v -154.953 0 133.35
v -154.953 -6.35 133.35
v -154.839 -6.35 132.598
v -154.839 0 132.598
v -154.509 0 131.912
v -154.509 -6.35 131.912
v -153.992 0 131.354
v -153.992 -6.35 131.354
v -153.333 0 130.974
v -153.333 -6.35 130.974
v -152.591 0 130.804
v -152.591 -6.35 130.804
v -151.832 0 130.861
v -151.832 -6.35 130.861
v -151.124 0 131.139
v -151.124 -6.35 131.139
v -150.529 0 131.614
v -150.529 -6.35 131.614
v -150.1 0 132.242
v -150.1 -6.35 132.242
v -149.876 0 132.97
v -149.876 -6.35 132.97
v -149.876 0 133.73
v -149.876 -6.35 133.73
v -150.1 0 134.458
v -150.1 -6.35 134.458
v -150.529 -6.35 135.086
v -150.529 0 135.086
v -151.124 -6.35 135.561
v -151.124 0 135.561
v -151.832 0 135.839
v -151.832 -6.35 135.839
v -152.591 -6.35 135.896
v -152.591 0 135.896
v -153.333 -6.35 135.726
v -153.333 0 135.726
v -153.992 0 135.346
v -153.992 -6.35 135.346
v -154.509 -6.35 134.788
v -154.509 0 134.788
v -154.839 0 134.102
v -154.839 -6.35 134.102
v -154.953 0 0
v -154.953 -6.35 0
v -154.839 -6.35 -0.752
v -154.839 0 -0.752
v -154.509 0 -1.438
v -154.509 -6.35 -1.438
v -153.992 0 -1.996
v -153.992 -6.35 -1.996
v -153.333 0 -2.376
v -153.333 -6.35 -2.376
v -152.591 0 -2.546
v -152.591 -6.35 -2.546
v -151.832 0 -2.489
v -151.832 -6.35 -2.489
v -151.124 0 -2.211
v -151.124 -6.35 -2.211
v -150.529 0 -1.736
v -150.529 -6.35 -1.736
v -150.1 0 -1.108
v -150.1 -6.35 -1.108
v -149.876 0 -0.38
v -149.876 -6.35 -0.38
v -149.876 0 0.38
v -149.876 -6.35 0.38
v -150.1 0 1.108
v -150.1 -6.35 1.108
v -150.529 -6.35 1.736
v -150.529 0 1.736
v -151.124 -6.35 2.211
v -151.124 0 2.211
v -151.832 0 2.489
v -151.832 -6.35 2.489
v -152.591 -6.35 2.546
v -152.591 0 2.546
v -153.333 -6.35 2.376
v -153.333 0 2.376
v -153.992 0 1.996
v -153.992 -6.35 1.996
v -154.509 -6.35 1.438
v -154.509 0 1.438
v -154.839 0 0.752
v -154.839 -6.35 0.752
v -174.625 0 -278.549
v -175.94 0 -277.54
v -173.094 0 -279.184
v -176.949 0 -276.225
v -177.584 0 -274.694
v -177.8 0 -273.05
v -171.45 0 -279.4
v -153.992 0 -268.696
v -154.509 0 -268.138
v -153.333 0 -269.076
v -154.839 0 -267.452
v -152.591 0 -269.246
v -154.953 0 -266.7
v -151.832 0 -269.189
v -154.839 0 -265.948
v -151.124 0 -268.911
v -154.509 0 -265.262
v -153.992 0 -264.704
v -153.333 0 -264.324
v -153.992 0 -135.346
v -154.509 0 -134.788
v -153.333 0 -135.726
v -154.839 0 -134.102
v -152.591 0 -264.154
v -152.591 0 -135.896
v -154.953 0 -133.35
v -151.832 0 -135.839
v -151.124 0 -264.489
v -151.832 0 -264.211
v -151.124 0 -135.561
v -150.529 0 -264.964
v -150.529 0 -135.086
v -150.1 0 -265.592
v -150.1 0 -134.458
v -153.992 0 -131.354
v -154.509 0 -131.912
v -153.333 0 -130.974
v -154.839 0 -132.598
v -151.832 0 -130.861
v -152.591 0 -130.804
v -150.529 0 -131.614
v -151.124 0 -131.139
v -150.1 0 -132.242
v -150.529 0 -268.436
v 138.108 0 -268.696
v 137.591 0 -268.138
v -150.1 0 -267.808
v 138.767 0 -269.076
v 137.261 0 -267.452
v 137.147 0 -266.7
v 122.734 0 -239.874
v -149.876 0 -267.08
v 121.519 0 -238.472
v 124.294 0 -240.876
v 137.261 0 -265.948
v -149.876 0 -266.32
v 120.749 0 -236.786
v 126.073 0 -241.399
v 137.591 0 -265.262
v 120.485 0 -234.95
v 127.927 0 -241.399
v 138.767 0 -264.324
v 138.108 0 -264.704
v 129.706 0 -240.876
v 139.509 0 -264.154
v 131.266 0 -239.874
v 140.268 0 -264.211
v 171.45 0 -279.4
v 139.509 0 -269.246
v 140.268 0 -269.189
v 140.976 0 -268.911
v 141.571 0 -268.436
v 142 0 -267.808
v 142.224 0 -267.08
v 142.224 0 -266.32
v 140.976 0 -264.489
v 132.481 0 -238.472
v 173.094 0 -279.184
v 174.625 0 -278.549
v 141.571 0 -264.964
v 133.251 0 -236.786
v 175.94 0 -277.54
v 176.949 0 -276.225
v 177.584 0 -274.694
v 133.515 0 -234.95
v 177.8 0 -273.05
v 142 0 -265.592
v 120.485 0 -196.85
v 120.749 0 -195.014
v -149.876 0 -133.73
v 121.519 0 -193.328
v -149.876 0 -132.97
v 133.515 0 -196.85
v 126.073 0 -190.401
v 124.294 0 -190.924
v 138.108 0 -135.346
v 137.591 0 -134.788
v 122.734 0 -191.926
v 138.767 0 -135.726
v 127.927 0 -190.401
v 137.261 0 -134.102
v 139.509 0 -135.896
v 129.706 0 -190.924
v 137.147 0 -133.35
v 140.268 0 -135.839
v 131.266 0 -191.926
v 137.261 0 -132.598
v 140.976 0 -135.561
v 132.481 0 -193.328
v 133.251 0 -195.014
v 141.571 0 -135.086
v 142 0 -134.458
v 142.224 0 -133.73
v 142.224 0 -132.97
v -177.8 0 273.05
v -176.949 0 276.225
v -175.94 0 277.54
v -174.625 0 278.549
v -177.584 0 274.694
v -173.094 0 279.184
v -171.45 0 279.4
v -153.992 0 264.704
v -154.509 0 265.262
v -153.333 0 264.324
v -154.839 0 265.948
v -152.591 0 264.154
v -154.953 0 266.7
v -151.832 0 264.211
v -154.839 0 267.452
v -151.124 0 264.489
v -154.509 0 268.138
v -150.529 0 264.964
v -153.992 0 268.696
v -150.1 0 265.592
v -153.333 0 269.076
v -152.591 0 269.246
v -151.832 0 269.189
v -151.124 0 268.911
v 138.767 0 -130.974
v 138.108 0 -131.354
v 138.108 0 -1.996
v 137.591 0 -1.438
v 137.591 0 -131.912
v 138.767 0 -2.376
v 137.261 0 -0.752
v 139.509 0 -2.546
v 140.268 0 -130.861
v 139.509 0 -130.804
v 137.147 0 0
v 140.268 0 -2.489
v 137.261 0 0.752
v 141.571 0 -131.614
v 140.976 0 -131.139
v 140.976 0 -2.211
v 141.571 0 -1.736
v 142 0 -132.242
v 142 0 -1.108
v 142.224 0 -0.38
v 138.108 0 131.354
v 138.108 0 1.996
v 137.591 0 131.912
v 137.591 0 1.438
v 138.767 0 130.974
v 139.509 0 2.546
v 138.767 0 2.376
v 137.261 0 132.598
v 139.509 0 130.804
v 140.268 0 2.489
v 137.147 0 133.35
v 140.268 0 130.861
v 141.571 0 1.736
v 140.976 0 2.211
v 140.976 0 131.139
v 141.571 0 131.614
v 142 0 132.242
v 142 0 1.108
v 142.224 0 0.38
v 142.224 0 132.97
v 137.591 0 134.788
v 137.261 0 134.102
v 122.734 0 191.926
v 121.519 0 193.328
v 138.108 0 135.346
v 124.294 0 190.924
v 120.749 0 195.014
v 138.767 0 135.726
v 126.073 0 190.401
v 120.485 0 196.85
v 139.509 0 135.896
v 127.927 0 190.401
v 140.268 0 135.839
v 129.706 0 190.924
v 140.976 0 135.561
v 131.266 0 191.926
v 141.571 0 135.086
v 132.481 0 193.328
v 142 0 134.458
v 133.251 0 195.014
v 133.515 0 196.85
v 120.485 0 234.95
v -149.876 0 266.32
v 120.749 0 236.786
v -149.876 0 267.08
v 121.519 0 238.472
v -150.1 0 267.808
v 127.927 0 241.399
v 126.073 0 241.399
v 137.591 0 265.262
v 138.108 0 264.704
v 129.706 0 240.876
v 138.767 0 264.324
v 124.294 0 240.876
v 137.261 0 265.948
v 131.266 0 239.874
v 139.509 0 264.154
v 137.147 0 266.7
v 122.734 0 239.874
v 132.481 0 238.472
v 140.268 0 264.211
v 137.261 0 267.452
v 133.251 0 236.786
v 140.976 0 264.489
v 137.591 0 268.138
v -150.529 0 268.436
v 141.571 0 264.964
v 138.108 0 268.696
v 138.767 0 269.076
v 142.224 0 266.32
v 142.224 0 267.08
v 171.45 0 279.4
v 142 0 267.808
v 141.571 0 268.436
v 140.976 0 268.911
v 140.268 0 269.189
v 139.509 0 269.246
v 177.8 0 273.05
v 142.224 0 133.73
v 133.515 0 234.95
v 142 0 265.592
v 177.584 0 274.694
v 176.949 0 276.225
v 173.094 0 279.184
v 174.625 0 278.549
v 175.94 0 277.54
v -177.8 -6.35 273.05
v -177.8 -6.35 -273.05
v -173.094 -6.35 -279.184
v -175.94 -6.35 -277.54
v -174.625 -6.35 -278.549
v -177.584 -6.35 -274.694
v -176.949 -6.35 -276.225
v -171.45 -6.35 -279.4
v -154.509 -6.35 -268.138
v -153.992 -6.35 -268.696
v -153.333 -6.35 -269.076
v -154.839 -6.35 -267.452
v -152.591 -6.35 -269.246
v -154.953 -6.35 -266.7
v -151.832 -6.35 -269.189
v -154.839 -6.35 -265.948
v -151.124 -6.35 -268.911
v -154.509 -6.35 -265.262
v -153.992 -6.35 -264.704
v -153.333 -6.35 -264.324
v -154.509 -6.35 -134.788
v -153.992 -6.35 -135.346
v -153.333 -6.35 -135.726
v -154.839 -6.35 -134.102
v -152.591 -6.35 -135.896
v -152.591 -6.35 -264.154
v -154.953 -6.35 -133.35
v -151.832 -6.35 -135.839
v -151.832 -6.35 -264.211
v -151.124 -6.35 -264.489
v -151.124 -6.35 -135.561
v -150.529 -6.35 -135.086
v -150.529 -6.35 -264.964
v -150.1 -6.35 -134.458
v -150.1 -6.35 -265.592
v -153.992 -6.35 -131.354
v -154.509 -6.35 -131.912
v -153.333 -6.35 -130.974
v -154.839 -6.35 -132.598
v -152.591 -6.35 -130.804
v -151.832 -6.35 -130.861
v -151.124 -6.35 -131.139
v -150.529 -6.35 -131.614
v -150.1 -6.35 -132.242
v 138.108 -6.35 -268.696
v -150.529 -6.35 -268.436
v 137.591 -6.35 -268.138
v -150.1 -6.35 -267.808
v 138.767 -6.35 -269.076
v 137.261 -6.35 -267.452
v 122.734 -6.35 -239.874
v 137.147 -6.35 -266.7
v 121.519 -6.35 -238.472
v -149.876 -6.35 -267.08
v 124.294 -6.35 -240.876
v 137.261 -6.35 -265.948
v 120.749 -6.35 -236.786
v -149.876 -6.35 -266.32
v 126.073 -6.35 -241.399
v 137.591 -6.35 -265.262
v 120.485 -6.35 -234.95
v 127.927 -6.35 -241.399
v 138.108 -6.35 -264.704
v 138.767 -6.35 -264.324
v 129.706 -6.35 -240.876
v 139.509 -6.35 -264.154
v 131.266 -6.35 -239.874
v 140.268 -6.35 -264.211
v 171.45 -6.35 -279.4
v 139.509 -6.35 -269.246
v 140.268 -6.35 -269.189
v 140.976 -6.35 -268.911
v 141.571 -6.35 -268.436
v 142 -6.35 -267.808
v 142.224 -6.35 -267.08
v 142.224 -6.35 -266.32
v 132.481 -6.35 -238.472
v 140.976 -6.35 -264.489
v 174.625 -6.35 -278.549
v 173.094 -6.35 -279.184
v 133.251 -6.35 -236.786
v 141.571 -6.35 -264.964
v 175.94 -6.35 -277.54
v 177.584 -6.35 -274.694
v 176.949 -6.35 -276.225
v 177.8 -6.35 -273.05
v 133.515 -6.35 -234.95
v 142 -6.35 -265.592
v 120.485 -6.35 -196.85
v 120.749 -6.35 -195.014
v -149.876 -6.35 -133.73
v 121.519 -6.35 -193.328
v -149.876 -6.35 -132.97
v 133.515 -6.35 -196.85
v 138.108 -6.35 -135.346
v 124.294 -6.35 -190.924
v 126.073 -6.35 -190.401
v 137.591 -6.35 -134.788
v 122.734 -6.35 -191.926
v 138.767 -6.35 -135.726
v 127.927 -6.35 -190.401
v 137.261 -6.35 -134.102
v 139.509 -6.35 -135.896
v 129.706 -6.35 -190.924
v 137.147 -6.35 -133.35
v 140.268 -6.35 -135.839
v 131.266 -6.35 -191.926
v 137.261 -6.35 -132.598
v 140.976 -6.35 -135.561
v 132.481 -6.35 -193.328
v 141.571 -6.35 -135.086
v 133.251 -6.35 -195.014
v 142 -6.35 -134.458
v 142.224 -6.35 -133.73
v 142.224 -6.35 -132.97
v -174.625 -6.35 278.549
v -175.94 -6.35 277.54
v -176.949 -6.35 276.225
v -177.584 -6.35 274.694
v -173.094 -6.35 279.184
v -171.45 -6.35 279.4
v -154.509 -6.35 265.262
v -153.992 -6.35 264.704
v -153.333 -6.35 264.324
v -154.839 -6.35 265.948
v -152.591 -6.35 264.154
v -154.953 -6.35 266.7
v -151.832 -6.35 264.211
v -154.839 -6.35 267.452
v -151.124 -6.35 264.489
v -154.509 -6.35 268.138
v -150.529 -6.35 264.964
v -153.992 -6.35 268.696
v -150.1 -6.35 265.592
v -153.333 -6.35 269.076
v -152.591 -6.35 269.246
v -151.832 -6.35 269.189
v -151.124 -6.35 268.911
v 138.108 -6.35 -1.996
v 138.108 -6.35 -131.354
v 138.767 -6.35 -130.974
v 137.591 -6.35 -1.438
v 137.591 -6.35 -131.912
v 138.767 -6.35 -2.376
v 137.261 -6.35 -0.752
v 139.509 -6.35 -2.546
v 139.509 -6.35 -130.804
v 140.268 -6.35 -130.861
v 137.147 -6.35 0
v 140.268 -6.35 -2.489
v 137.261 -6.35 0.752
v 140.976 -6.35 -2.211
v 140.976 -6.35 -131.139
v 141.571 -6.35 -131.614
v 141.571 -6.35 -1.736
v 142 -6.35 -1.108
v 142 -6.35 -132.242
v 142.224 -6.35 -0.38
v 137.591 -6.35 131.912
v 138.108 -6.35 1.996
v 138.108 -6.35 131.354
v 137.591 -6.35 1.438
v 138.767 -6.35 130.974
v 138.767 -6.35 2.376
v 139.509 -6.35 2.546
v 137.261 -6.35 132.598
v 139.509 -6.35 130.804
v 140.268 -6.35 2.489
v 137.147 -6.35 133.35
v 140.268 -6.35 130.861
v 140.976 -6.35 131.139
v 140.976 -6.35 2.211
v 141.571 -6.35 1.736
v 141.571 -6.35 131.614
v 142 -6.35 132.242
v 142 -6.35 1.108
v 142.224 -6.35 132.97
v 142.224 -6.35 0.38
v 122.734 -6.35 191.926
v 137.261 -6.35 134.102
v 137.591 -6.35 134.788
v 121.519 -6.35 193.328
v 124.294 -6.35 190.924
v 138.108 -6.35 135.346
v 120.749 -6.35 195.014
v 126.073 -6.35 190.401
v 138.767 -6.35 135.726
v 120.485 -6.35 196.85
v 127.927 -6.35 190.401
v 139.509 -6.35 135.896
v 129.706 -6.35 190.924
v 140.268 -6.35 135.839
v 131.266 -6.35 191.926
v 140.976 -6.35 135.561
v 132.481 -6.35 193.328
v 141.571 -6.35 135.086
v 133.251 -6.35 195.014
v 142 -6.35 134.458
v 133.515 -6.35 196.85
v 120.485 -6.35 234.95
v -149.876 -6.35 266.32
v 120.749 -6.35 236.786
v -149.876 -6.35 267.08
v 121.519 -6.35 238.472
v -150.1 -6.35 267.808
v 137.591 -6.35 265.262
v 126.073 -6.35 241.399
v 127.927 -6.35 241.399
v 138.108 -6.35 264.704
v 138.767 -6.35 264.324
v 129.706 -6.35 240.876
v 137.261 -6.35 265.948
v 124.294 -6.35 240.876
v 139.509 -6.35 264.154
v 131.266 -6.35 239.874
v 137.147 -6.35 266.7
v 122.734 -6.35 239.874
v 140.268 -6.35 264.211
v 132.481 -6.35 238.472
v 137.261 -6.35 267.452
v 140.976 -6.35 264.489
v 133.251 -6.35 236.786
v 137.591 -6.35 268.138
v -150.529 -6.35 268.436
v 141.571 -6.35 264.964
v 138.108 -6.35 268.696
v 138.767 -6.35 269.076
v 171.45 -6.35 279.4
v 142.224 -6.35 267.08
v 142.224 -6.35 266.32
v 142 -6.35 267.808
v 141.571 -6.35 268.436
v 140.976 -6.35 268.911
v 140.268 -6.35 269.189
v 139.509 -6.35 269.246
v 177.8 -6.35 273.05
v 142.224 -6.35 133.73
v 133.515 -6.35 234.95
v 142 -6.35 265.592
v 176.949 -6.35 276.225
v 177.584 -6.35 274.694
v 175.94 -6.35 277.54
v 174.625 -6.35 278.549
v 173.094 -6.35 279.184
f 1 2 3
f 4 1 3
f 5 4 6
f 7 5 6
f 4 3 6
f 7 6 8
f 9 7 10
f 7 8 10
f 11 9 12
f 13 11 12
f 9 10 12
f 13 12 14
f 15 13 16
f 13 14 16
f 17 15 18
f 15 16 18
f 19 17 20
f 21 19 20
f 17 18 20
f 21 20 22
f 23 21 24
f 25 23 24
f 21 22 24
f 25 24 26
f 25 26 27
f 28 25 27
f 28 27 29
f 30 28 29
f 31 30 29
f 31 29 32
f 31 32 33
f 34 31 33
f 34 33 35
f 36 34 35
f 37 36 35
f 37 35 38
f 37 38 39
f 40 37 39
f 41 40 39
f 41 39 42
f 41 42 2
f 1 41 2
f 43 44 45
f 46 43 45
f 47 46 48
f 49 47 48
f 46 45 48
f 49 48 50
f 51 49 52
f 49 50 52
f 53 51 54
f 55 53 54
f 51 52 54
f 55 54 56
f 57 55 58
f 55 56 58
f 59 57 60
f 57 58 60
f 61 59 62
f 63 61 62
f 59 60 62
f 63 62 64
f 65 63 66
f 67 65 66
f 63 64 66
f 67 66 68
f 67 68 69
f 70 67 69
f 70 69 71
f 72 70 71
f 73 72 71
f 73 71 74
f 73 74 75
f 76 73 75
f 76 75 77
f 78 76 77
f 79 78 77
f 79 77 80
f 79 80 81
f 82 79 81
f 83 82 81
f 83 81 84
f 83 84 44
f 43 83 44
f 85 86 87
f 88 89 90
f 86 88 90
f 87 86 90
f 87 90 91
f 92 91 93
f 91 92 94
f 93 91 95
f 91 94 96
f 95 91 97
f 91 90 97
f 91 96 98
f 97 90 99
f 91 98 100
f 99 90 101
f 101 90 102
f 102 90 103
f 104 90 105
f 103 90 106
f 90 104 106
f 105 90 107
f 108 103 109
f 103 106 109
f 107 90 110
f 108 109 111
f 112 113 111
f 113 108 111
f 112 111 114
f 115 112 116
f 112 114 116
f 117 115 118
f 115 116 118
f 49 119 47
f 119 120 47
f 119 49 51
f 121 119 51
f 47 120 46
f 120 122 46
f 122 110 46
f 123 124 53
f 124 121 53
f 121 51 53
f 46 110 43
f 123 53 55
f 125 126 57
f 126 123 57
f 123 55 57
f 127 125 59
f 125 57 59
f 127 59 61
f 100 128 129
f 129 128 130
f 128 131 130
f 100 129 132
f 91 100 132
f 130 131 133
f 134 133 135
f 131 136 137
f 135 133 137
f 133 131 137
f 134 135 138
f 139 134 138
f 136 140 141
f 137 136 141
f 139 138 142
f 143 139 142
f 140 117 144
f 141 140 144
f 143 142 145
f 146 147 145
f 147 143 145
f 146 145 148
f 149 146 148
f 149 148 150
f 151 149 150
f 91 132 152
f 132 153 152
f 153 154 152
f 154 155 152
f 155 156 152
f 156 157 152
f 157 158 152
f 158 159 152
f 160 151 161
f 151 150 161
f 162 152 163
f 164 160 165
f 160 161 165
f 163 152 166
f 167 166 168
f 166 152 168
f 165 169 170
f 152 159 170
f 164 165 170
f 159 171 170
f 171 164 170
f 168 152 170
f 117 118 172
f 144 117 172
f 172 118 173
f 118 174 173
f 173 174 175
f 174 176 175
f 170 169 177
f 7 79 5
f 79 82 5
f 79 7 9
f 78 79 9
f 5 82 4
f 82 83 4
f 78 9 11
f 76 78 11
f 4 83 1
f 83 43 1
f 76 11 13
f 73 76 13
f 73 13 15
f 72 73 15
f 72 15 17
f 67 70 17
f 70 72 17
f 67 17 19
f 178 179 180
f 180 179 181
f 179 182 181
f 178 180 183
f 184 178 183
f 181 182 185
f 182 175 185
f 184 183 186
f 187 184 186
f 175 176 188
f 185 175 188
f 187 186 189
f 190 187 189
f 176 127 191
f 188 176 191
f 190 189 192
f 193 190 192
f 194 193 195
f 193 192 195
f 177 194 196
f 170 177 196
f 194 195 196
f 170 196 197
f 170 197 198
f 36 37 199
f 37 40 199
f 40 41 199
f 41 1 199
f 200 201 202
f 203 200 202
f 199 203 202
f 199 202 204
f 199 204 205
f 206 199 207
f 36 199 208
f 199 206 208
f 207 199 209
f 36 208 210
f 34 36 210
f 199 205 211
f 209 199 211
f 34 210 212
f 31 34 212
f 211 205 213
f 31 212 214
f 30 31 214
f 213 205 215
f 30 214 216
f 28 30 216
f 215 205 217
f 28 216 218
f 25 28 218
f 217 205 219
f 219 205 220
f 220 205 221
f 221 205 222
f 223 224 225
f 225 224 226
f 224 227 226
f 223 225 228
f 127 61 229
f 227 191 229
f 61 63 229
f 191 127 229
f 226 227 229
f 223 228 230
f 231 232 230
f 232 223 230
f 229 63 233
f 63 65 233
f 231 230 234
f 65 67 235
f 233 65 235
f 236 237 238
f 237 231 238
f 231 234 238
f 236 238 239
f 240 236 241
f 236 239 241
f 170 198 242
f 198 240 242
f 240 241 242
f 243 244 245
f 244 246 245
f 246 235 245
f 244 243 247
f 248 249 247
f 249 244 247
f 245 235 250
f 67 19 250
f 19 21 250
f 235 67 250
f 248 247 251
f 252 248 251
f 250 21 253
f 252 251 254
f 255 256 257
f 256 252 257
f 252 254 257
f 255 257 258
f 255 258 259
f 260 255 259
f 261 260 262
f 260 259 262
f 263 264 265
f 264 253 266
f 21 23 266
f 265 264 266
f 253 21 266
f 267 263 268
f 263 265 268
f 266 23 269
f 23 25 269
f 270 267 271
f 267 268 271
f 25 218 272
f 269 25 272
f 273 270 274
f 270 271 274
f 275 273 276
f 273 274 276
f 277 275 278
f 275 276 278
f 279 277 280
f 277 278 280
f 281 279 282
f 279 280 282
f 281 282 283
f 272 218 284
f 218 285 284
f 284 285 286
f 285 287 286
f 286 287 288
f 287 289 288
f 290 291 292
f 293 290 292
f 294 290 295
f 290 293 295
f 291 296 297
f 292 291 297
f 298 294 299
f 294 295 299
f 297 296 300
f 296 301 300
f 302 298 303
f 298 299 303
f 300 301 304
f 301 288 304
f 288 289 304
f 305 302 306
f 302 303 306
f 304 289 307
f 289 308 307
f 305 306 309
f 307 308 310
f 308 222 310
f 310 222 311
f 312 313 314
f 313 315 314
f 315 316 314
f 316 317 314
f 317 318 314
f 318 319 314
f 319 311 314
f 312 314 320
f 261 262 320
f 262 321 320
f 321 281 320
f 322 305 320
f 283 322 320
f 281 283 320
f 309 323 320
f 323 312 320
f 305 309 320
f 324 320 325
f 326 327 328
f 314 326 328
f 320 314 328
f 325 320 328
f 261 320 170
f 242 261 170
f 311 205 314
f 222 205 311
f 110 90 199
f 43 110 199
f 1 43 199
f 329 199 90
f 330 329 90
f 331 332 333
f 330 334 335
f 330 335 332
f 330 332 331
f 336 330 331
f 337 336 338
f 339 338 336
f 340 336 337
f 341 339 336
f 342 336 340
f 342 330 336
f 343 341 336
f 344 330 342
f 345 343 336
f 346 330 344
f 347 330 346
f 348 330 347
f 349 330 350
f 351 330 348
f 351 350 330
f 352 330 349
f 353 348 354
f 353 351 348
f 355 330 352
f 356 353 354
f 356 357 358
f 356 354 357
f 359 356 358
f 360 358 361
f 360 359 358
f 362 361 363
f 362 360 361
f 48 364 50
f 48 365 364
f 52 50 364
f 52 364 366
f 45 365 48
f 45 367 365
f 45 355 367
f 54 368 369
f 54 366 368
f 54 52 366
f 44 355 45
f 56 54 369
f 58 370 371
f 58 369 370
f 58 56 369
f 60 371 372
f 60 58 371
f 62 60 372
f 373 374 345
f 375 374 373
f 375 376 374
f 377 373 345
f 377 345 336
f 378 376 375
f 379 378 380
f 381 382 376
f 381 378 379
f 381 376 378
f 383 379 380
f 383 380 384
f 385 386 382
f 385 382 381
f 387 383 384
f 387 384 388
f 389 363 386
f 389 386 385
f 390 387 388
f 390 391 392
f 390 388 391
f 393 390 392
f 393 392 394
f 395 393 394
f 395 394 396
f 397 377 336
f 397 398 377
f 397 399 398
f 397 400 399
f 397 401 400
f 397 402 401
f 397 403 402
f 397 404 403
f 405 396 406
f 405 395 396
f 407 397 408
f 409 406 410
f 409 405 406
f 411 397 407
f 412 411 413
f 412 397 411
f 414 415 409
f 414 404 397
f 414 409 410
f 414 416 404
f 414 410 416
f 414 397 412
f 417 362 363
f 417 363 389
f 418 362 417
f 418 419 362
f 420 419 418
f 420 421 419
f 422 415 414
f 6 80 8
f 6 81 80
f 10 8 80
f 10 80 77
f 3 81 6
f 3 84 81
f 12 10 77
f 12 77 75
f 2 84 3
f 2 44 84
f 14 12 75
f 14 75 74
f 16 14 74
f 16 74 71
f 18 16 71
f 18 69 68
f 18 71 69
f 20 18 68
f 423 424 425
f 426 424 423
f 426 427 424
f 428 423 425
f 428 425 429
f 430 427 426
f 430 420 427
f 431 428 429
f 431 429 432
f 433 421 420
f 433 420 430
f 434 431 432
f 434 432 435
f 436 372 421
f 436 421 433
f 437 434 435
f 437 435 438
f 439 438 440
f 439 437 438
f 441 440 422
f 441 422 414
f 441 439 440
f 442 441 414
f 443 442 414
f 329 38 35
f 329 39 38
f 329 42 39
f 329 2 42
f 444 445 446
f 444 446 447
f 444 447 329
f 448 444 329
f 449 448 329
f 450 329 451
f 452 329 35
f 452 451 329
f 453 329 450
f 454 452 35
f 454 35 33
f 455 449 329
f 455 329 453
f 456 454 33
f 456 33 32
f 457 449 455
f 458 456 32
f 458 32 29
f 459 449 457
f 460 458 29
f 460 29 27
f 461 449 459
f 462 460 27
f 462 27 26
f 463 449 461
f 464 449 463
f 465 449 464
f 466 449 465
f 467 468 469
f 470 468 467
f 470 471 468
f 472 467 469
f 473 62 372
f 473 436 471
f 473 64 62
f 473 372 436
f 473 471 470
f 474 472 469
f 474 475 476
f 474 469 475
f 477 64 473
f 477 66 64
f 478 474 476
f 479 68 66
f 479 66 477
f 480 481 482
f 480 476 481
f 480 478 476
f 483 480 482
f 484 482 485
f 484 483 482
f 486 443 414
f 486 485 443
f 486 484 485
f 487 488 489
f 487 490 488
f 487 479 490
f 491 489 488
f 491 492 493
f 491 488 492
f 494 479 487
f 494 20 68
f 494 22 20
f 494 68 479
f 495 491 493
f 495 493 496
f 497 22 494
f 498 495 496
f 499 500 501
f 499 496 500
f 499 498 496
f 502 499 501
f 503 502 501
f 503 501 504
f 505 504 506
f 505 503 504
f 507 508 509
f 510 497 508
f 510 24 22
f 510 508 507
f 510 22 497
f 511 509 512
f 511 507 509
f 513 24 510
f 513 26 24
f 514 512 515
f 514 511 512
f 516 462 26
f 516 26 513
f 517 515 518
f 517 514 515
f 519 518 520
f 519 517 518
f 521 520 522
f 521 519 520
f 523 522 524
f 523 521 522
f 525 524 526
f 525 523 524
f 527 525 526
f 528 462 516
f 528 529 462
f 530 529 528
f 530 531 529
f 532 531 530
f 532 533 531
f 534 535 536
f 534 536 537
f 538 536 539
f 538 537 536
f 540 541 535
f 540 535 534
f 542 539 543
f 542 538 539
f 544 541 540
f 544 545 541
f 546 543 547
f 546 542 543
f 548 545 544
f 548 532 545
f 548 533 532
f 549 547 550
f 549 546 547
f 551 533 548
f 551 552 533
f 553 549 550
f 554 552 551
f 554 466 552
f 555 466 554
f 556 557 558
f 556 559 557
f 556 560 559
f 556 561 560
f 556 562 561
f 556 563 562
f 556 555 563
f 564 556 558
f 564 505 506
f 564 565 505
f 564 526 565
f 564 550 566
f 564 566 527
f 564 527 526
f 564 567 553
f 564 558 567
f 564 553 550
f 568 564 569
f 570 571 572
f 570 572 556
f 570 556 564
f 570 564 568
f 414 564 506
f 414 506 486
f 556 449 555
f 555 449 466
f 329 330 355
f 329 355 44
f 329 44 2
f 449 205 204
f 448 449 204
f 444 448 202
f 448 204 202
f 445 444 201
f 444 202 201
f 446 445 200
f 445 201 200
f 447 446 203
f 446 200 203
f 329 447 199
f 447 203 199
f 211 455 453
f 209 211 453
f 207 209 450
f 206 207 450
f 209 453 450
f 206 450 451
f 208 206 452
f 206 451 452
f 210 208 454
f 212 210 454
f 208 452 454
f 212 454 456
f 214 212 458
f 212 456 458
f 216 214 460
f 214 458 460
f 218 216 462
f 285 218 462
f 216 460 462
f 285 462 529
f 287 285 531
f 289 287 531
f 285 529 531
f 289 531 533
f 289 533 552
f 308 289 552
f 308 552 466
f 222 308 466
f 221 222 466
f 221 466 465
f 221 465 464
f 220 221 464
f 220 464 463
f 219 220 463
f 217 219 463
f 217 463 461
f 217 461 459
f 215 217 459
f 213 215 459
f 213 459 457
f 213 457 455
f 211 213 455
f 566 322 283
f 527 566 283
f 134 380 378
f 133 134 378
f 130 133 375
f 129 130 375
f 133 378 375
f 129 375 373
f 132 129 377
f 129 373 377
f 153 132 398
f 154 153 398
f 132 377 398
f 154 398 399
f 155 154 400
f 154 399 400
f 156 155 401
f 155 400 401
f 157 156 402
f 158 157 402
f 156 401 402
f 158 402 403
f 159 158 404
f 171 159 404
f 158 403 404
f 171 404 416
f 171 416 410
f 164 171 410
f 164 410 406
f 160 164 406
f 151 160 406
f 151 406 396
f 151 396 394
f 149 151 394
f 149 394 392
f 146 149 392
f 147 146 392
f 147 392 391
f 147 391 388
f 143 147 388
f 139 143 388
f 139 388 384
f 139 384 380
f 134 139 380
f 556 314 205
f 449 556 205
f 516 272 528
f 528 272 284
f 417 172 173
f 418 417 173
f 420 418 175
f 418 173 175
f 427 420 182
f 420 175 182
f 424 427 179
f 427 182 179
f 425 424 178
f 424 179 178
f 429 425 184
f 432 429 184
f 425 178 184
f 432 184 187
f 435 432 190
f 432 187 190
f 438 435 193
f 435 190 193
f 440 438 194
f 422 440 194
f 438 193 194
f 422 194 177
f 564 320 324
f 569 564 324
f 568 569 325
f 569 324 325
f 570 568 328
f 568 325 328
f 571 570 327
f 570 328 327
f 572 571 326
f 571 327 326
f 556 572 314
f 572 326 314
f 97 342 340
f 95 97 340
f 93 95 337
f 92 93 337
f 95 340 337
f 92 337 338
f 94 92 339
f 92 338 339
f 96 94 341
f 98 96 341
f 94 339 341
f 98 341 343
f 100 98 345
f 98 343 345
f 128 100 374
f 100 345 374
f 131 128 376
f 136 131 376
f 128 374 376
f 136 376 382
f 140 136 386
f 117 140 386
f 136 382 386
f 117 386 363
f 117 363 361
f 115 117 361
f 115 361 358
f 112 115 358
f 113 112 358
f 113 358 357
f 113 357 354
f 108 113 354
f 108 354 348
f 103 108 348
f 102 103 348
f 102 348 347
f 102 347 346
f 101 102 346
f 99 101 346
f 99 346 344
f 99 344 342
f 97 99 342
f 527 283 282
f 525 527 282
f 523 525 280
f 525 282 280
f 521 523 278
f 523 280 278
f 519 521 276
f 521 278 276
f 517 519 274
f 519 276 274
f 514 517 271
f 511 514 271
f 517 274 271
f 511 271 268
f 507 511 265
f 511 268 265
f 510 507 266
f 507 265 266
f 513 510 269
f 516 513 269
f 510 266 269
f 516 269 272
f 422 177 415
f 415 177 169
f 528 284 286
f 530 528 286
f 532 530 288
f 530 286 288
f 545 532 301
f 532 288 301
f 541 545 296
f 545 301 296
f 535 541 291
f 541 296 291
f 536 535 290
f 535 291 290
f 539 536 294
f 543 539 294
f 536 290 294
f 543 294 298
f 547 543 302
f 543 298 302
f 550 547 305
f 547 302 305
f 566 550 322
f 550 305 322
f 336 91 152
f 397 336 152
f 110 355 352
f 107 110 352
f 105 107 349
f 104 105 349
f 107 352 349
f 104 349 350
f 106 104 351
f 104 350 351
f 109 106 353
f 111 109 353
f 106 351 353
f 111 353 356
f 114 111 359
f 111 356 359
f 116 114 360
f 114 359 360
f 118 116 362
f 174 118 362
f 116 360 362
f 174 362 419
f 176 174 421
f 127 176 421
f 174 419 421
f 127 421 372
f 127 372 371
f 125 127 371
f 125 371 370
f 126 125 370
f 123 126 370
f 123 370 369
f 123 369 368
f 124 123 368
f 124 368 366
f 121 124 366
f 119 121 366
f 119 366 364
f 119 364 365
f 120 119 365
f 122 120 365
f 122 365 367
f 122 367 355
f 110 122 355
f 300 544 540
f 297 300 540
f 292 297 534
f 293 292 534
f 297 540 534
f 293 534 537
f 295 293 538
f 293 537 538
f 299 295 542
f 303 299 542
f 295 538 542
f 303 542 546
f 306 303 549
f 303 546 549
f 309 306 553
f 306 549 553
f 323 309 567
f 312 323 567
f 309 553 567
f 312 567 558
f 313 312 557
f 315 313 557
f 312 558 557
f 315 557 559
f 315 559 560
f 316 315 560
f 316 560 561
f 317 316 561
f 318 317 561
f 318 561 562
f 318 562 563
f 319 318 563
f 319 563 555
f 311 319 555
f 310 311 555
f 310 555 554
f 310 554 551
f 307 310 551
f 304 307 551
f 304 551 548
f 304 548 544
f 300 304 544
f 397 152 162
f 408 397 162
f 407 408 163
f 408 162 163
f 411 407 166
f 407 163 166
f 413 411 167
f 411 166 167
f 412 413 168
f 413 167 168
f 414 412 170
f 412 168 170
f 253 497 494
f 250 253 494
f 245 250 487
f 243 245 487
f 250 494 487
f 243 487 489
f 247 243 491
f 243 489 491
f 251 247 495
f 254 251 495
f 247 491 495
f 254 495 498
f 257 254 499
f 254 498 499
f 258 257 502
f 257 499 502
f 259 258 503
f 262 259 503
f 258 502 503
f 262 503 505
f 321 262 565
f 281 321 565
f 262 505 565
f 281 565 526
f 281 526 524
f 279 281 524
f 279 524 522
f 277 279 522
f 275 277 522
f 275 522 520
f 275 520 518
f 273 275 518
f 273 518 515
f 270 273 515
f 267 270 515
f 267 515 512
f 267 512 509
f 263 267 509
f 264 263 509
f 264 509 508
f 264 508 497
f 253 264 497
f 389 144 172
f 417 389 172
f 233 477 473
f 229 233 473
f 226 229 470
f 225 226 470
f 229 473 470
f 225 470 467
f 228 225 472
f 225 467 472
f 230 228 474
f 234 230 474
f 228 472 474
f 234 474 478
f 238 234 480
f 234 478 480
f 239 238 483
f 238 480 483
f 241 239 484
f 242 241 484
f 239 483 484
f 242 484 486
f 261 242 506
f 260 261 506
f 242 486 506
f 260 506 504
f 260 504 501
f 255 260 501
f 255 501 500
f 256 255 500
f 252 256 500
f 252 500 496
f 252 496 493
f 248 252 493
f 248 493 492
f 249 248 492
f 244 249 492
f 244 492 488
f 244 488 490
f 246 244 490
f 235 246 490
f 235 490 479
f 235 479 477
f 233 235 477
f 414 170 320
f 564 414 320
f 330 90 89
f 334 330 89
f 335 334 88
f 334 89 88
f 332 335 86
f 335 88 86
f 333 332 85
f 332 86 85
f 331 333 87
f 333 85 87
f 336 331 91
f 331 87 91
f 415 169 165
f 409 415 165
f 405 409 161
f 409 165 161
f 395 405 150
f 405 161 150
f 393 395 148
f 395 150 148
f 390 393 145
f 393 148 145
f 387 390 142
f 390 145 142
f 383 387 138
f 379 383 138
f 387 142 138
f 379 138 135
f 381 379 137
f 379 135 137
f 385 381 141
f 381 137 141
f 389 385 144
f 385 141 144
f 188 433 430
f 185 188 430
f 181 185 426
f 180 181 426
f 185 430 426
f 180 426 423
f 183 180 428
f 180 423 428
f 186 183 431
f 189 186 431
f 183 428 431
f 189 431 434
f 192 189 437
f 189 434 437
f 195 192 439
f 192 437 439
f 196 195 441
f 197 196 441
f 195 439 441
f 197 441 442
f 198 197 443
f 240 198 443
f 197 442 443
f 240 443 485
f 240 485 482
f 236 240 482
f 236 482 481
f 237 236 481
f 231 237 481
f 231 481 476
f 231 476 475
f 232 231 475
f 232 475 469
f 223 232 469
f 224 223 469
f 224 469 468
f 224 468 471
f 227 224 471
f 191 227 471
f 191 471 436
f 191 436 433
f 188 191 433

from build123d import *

# Parameters (mm, degrees)
F1_DEPTH = 6.35
F2_D     = 5.1054


with BuildPart() as f1:
    # F0 (on Front) → F1 (new body)
    with BuildSketch(Plane.XZ):
        with BuildLine():
            Line((-171.45, -279.4), (171.45, -279.4))
            ThreePointArc((171.45, -279.4), (175.9401280605, -277.5401280605), (177.8, -273.05))
            Line((177.8, -273.05), (177.8, 273.05))
            ThreePointArc((177.8, 273.05), (175.9401280605, 277.5401280605), (171.45, 279.4))
            Line((171.45, 279.4), (-171.45, 279.4))
            ThreePointArc((-171.45, 279.4), (-175.9401280605, 277.5401280605), (-177.8, 273.05))
            Line((-177.8, 273.05), (-177.8, -273.05))
            ThreePointArc((-177.8, -273.05), (-175.9401280605, -277.5401280605), (-171.45, -279.4))
        make_face()
        with BuildLine():
            Line((133.5151, -196.85), (133.5151, -234.95))
            ThreePointArc((133.5151, -234.95), (127, -241.4651), (120.4849, -234.95))
            Line((120.4849, -234.95), (120.4849, -196.85))
            ThreePointArc((120.4849, -196.85), (127, -190.3349), (133.5151, -196.85))
        make_face(mode=Mode.SUBTRACT)
        with BuildLine():
            ThreePointArc((120.4849, 234.95), (127, 241.4651), (133.5151, 234.95))
            Line((133.5151, 234.95), (133.5151, 196.85))
            ThreePointArc((133.5151, 196.85), (127, 190.3349), (120.4849, 196.85))
            Line((120.4849, 196.85), (120.4849, 234.95))
        make_face(mode=Mode.SUBTRACT)
    extrude(amount=F1_DEPTH)

    # F2 (through all)
    with Locations(Plane(origin=(0, 0, 0), x_dir=(1, 0, 0), z_dir=(0, 1, 0))):
        with Locations((139.7, 266.7), (139.7, 133.35), (139.7, 0), (139.7, -133.35), (139.7, -266.7), (-152.4, 266.7), (-152.4, 0), (-152.4, -133.35), (-152.4, -266.7), (-152.4, 133.35)):
            Hole(F2_D / 2)


solid = f1.part
